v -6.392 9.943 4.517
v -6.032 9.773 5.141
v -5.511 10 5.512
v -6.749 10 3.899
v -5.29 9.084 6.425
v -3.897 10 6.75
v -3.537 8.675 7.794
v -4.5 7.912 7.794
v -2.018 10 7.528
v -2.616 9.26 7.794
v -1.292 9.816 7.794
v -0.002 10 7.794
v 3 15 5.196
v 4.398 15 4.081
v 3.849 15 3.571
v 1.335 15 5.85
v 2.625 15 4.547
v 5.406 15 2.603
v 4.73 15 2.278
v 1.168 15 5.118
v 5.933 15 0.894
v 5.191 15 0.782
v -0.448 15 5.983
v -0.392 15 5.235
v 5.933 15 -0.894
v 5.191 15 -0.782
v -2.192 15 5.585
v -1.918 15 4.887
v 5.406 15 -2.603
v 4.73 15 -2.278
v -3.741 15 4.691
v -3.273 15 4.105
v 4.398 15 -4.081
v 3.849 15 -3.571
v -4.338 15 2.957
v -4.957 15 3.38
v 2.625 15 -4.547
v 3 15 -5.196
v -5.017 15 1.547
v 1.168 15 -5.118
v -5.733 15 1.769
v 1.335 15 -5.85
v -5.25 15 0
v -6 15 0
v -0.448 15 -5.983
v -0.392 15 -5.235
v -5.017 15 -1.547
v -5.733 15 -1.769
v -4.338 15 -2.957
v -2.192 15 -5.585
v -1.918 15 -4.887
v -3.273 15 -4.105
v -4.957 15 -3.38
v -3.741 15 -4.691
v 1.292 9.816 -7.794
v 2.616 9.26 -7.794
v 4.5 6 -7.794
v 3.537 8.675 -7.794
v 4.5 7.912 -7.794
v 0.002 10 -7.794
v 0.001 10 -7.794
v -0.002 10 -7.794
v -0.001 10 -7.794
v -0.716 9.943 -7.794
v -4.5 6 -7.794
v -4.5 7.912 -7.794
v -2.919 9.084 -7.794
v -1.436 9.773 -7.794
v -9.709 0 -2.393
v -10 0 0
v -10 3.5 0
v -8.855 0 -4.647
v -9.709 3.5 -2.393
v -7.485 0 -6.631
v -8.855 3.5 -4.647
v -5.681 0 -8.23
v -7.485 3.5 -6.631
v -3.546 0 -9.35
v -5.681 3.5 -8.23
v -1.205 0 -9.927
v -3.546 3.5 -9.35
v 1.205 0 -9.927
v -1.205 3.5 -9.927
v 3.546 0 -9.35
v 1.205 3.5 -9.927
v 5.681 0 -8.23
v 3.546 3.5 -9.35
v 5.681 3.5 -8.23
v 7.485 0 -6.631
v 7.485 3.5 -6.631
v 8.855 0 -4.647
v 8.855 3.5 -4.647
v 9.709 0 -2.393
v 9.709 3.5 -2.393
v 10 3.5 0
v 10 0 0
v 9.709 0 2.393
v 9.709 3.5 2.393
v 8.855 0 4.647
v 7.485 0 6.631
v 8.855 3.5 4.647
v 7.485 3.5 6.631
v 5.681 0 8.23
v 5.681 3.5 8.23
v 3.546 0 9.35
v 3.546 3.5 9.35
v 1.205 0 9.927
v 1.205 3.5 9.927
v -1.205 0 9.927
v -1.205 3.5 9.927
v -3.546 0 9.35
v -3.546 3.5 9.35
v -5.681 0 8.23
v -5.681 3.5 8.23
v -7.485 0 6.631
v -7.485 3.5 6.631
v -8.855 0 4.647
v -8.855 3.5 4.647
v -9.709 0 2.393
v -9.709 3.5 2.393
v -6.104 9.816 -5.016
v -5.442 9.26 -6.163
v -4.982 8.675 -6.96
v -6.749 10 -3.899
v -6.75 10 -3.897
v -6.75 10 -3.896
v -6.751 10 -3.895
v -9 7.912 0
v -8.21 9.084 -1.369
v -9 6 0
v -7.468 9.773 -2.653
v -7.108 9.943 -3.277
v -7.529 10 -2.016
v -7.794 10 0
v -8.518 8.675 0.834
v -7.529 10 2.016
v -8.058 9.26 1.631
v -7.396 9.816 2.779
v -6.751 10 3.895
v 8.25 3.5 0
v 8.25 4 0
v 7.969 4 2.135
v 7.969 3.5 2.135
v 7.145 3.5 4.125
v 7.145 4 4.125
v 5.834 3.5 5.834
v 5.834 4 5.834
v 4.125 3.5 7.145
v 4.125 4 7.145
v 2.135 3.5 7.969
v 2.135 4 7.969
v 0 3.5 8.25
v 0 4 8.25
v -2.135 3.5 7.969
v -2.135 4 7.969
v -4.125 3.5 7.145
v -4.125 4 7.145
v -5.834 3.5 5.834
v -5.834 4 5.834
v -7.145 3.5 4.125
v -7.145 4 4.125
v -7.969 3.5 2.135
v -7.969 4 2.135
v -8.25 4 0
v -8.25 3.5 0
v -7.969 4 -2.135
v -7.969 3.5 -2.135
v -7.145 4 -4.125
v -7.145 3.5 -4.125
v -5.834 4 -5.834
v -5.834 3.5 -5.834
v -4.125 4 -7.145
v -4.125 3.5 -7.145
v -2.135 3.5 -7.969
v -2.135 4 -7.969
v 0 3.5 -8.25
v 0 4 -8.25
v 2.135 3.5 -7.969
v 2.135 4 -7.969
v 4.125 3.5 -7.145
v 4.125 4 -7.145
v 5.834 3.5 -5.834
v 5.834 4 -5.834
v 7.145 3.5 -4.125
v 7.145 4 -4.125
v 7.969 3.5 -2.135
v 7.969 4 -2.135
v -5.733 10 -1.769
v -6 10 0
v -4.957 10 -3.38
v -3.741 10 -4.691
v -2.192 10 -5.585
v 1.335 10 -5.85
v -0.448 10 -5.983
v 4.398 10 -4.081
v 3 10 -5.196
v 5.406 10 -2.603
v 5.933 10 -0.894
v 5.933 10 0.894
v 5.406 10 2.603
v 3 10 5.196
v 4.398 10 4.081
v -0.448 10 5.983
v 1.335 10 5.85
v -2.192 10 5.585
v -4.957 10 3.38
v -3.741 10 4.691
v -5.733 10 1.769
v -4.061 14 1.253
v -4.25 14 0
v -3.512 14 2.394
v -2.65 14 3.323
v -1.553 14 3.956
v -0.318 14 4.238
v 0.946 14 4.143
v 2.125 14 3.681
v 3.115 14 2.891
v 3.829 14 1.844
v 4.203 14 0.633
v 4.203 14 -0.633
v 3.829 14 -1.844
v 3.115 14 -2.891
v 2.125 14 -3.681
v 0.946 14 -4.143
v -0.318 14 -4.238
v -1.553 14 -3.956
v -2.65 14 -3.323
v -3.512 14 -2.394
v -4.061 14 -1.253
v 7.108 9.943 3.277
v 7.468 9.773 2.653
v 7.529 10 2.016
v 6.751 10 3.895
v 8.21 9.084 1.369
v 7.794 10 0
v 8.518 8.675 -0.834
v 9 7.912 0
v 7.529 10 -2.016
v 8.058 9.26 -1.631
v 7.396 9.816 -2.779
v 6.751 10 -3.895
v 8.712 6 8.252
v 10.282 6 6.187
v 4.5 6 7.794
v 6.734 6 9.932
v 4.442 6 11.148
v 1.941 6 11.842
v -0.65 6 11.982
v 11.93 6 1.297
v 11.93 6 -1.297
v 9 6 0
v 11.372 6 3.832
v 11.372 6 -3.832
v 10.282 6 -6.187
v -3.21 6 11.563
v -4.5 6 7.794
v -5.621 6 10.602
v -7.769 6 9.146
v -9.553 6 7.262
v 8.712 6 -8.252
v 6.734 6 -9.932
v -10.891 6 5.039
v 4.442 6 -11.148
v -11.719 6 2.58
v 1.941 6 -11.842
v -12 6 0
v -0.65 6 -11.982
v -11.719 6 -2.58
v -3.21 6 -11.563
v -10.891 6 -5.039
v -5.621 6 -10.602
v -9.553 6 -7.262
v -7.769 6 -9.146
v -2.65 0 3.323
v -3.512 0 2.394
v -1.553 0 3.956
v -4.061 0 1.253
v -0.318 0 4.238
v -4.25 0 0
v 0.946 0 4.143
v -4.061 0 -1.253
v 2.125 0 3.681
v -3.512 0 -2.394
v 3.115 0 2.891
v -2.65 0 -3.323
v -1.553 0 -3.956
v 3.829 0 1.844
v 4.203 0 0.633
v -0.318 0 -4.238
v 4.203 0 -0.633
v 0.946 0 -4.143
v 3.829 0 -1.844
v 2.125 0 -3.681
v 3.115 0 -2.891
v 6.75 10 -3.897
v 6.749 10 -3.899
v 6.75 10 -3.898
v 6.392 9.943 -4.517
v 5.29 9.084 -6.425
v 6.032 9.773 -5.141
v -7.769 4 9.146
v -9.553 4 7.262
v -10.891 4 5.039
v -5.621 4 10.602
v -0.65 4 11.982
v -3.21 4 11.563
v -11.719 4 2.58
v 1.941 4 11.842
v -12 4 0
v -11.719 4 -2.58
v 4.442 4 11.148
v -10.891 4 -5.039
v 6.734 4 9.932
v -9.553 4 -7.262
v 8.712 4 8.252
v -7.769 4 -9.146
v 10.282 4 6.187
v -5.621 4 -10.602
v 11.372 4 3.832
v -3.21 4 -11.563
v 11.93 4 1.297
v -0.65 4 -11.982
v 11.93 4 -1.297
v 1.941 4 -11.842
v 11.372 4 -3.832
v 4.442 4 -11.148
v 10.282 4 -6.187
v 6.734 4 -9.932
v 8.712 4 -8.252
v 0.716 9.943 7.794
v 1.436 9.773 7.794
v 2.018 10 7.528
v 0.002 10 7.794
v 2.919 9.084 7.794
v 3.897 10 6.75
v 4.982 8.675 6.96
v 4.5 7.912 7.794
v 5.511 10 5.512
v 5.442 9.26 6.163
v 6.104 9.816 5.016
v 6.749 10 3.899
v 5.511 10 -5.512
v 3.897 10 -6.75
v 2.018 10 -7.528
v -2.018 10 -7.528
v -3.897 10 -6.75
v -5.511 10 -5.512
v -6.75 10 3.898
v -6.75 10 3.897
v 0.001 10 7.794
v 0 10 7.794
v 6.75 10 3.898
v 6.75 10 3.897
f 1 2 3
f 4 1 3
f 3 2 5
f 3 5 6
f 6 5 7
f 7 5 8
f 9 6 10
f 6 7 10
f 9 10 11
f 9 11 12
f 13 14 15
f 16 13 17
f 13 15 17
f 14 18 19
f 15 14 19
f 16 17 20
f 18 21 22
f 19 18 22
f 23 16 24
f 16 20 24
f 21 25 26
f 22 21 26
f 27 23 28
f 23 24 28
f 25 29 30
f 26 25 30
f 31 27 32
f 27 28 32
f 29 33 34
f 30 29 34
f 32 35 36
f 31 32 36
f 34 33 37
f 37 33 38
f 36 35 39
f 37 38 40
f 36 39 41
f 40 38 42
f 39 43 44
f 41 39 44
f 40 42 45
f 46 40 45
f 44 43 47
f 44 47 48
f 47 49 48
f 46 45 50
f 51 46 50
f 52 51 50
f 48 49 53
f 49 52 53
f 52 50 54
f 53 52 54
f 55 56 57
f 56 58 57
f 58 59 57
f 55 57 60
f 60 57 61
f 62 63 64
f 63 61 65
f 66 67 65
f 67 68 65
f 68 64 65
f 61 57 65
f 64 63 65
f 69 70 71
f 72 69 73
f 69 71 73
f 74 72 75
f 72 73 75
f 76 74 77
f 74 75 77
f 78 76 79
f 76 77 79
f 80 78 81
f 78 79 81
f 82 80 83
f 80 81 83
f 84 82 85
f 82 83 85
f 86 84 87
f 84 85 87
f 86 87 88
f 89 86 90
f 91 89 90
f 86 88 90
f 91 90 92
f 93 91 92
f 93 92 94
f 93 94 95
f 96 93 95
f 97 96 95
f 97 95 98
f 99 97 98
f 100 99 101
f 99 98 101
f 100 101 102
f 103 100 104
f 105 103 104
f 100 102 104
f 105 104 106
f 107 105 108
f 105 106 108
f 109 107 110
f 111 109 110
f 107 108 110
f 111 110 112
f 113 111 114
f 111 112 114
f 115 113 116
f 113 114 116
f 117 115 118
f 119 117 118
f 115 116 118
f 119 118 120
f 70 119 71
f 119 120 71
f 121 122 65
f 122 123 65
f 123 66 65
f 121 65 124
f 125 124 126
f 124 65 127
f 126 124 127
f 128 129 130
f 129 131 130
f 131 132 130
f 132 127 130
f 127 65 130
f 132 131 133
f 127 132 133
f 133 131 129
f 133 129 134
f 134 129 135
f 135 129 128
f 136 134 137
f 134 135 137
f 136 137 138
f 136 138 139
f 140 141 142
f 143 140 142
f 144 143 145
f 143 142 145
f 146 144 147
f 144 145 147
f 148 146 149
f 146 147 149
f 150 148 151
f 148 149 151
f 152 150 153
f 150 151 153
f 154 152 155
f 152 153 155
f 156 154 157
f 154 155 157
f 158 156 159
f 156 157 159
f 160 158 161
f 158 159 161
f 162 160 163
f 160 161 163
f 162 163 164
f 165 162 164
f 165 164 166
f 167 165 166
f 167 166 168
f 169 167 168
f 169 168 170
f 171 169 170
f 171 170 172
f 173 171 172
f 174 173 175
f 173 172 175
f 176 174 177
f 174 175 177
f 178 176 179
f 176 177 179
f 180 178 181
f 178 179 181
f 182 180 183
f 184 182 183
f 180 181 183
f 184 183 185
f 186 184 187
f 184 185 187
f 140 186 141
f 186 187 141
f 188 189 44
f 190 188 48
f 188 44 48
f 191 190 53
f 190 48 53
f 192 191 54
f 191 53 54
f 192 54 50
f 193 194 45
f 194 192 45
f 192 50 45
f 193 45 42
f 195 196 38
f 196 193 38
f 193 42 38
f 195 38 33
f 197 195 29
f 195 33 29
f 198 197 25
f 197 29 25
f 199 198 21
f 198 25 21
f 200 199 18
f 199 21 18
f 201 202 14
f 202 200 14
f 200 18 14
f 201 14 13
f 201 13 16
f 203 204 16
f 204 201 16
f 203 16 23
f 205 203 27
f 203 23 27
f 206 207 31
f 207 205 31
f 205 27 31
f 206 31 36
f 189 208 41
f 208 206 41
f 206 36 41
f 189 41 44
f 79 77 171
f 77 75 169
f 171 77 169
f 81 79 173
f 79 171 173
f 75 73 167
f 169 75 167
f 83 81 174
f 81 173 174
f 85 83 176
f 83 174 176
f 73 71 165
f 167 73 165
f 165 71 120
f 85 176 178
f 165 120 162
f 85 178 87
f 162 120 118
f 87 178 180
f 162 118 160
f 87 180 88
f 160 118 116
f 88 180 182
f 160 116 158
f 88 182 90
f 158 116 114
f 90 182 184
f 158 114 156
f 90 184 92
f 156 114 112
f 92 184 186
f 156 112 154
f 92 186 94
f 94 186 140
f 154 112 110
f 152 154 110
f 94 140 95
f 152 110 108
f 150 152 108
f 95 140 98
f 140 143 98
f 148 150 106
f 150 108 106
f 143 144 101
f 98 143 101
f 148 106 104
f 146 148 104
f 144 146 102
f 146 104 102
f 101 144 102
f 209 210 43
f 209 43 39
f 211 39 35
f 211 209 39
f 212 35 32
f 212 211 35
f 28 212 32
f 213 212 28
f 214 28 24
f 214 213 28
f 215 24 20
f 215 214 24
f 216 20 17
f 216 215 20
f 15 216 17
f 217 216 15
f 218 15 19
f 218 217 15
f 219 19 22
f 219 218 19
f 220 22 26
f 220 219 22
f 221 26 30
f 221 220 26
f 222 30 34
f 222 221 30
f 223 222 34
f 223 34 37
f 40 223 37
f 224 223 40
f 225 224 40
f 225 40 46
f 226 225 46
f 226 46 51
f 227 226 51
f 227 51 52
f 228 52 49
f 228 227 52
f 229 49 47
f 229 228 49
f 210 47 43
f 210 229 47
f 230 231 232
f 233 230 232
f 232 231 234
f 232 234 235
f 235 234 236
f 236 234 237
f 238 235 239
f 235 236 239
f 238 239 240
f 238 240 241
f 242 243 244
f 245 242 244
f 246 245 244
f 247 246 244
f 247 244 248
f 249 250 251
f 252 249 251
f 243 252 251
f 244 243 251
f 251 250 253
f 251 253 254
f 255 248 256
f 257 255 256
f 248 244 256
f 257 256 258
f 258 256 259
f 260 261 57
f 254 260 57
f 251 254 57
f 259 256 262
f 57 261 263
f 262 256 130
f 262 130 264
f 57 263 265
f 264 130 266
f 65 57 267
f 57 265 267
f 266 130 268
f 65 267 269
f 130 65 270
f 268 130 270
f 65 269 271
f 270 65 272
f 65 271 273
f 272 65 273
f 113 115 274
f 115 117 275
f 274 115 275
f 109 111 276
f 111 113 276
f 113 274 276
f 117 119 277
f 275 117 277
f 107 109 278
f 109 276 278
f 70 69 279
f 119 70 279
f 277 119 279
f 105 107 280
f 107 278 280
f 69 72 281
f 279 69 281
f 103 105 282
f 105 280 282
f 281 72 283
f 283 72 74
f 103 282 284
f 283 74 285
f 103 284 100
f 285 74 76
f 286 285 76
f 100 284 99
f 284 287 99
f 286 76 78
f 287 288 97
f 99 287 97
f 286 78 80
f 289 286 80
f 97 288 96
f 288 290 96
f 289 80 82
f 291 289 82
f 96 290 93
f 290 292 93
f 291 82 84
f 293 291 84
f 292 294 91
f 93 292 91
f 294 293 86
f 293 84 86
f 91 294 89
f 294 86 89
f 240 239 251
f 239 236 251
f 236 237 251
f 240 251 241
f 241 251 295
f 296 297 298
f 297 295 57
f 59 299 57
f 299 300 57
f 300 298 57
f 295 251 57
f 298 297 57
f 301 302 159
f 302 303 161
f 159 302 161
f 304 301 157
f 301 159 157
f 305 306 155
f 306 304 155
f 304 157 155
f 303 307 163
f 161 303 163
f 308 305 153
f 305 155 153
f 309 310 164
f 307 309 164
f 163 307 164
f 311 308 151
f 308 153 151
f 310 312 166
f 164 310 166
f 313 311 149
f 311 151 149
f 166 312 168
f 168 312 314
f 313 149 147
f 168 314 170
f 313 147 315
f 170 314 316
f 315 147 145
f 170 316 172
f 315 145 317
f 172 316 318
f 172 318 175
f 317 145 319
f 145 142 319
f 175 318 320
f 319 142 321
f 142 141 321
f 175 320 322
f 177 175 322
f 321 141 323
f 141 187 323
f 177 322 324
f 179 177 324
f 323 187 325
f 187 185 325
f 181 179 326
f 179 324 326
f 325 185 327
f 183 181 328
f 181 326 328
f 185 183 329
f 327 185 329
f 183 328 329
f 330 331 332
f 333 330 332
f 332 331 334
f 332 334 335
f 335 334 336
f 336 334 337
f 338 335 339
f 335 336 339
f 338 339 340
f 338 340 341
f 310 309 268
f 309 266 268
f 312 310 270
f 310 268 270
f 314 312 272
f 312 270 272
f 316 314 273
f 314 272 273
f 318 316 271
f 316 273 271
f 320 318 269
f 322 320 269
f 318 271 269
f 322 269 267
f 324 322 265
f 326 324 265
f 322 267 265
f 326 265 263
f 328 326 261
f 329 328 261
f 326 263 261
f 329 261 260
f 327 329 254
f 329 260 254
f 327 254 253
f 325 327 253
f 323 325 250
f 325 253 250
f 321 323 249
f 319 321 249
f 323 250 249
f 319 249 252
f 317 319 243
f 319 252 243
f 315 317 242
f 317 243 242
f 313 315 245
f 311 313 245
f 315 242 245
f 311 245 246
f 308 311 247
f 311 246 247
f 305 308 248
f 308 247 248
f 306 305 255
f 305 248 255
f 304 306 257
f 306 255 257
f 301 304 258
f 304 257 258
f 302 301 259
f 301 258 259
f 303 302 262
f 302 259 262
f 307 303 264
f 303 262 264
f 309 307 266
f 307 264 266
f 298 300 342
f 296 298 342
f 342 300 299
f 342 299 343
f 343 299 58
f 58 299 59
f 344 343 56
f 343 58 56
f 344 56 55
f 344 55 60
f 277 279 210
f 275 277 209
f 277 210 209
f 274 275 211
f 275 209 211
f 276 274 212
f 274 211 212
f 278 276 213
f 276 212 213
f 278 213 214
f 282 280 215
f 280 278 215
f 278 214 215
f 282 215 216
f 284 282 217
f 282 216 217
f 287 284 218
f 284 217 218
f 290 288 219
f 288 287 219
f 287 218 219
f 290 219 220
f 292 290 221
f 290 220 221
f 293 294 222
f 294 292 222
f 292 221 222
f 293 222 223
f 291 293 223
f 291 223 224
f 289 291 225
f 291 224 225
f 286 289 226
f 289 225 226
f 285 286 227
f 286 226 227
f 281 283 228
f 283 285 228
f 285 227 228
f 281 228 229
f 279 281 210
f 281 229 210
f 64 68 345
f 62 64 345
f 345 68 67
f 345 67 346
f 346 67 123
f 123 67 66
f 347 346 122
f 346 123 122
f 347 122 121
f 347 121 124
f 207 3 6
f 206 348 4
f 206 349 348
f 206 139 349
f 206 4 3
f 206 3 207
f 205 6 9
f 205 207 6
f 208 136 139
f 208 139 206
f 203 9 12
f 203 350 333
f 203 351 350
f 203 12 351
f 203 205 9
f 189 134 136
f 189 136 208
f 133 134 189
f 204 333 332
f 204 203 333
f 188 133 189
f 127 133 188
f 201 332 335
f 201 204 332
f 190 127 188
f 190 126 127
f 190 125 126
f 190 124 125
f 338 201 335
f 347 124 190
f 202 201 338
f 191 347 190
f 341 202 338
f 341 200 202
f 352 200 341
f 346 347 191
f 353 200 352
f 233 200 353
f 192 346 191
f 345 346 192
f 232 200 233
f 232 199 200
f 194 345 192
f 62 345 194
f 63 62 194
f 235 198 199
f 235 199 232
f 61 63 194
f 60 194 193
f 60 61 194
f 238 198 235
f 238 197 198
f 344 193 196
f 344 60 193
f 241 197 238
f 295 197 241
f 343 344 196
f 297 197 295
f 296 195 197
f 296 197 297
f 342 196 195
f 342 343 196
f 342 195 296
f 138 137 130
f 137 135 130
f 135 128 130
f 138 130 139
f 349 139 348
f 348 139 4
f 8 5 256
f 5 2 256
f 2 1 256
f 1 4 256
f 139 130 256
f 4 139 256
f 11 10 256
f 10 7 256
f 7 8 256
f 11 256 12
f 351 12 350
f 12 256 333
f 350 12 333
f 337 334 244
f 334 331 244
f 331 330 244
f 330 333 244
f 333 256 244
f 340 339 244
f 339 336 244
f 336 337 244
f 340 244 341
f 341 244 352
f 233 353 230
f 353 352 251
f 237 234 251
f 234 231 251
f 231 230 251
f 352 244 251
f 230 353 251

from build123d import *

# Parameters (mm, degrees)
BOSS_EXTRUDE1_DEPTH = 4
SKETCH3_R           = 4.25
CUT_EXTRUDE1_DEPTH  = 10
CUT_EXTRUDE2_START  = -10
SKETCH4_R           = 4.25
CUT_EXTRUDE2_DEPTH  = 10
SKETCH5_OUTSIDE_W   = 33.422
SKETCH5_OUTSIDE_H   = 33.422
SKETCH5_OUTSIDE_R   = 8.25
CUT_EXTRUDE3_DEPTH  = 0.5
CHAMFER1_SIZE       = 1


# Read off the part's stored shape, not the designer's step: Cut-Extrude4
with BuildPart() as part:
    # Sketch1 → Revolve1 (revolve)
    with BuildSketch(Plane.XY, mode=Mode.PRIVATE) as revolve1_sk:
        Polygon((0, 0), (10, 0), (10, 4), (12, 4), (12, 6), (6, 6), (6, 15), (0, 15), align=None)
    revolve(revolve1_sk.sketch.rotate(Axis((0, 15, 0), (0, -1, 0)), 180), axis=Axis((0, 15, 0), (0, -1, 0)))

    # Sketch2 → Boss-Extrude1 (add)
    with BuildSketch(Plane(origin=(0, 6, 0), x_dir=(1, 0, 0), z_dir=(0, 1, 0))):
        Polygon((9, 0), (4.5, 7.794228634), (-4.5, 7.794228634), (-9, 0), (-4.5, -7.794228634), (4.5, -7.794228634), align=None)
    extrude(amount=BOSS_EXTRUDE1_DEPTH)

    # Sketch3 → Cut-Extrude1 (cut)
    with BuildSketch(Plane(origin=(0, 15, 0), x_dir=(1, 0, 0), z_dir=(0, 1, 0))):
        with Locations(Location((0, 0, 0), (0, 0, 180))):
            Circle(SKETCH3_R)
    extrude(amount=-CUT_EXTRUDE1_DEPTH, mode=Mode.SUBTRACT)

    # Sketch4 → Cut-Extrude2 (cut)
    with BuildSketch(Plane.XZ.offset(CUT_EXTRUDE2_START)):
        with Locations(Location((0, 0, 0), (0, 0, 180))):
            Circle(SKETCH4_R)
    extrude(amount=CUT_EXTRUDE2_DEPTH, mode=Mode.SUBTRACT)

    # Sketch5 outside → Cut-Extrude3 (cut)
    with BuildSketch(Plane.XZ.offset(-4)):
        Rectangle(SKETCH5_OUTSIDE_W, SKETCH5_OUTSIDE_H)
        Circle(SKETCH5_OUTSIDE_R, mode=Mode.SUBTRACT)
    extrude(amount=CUT_EXTRUDE3_DEPTH, mode=Mode.SUBTRACT)

    # Cut-Extrude4 outline → Cut-Extrude4 (revolve, cut)
    with BuildSketch(Plane.XY):
        Polygon((9.000000004, 10.000001017), (7.794228286, 10.000001017), (9.000000004, 7.911542725), align=None)
    revolve(axis=Axis((0, 0, 0), (0, 1, 0)), mode=Mode.SUBTRACT)

    # Chamfer1
    chamfer1_edges = [part.edges().sort_by_distance(p)[0] for p in [
        (4.25, 15, 0),
    ]]
    chamfer(chamfer1_edges, length=CHAMFER1_SIZE)


solid = part.part
